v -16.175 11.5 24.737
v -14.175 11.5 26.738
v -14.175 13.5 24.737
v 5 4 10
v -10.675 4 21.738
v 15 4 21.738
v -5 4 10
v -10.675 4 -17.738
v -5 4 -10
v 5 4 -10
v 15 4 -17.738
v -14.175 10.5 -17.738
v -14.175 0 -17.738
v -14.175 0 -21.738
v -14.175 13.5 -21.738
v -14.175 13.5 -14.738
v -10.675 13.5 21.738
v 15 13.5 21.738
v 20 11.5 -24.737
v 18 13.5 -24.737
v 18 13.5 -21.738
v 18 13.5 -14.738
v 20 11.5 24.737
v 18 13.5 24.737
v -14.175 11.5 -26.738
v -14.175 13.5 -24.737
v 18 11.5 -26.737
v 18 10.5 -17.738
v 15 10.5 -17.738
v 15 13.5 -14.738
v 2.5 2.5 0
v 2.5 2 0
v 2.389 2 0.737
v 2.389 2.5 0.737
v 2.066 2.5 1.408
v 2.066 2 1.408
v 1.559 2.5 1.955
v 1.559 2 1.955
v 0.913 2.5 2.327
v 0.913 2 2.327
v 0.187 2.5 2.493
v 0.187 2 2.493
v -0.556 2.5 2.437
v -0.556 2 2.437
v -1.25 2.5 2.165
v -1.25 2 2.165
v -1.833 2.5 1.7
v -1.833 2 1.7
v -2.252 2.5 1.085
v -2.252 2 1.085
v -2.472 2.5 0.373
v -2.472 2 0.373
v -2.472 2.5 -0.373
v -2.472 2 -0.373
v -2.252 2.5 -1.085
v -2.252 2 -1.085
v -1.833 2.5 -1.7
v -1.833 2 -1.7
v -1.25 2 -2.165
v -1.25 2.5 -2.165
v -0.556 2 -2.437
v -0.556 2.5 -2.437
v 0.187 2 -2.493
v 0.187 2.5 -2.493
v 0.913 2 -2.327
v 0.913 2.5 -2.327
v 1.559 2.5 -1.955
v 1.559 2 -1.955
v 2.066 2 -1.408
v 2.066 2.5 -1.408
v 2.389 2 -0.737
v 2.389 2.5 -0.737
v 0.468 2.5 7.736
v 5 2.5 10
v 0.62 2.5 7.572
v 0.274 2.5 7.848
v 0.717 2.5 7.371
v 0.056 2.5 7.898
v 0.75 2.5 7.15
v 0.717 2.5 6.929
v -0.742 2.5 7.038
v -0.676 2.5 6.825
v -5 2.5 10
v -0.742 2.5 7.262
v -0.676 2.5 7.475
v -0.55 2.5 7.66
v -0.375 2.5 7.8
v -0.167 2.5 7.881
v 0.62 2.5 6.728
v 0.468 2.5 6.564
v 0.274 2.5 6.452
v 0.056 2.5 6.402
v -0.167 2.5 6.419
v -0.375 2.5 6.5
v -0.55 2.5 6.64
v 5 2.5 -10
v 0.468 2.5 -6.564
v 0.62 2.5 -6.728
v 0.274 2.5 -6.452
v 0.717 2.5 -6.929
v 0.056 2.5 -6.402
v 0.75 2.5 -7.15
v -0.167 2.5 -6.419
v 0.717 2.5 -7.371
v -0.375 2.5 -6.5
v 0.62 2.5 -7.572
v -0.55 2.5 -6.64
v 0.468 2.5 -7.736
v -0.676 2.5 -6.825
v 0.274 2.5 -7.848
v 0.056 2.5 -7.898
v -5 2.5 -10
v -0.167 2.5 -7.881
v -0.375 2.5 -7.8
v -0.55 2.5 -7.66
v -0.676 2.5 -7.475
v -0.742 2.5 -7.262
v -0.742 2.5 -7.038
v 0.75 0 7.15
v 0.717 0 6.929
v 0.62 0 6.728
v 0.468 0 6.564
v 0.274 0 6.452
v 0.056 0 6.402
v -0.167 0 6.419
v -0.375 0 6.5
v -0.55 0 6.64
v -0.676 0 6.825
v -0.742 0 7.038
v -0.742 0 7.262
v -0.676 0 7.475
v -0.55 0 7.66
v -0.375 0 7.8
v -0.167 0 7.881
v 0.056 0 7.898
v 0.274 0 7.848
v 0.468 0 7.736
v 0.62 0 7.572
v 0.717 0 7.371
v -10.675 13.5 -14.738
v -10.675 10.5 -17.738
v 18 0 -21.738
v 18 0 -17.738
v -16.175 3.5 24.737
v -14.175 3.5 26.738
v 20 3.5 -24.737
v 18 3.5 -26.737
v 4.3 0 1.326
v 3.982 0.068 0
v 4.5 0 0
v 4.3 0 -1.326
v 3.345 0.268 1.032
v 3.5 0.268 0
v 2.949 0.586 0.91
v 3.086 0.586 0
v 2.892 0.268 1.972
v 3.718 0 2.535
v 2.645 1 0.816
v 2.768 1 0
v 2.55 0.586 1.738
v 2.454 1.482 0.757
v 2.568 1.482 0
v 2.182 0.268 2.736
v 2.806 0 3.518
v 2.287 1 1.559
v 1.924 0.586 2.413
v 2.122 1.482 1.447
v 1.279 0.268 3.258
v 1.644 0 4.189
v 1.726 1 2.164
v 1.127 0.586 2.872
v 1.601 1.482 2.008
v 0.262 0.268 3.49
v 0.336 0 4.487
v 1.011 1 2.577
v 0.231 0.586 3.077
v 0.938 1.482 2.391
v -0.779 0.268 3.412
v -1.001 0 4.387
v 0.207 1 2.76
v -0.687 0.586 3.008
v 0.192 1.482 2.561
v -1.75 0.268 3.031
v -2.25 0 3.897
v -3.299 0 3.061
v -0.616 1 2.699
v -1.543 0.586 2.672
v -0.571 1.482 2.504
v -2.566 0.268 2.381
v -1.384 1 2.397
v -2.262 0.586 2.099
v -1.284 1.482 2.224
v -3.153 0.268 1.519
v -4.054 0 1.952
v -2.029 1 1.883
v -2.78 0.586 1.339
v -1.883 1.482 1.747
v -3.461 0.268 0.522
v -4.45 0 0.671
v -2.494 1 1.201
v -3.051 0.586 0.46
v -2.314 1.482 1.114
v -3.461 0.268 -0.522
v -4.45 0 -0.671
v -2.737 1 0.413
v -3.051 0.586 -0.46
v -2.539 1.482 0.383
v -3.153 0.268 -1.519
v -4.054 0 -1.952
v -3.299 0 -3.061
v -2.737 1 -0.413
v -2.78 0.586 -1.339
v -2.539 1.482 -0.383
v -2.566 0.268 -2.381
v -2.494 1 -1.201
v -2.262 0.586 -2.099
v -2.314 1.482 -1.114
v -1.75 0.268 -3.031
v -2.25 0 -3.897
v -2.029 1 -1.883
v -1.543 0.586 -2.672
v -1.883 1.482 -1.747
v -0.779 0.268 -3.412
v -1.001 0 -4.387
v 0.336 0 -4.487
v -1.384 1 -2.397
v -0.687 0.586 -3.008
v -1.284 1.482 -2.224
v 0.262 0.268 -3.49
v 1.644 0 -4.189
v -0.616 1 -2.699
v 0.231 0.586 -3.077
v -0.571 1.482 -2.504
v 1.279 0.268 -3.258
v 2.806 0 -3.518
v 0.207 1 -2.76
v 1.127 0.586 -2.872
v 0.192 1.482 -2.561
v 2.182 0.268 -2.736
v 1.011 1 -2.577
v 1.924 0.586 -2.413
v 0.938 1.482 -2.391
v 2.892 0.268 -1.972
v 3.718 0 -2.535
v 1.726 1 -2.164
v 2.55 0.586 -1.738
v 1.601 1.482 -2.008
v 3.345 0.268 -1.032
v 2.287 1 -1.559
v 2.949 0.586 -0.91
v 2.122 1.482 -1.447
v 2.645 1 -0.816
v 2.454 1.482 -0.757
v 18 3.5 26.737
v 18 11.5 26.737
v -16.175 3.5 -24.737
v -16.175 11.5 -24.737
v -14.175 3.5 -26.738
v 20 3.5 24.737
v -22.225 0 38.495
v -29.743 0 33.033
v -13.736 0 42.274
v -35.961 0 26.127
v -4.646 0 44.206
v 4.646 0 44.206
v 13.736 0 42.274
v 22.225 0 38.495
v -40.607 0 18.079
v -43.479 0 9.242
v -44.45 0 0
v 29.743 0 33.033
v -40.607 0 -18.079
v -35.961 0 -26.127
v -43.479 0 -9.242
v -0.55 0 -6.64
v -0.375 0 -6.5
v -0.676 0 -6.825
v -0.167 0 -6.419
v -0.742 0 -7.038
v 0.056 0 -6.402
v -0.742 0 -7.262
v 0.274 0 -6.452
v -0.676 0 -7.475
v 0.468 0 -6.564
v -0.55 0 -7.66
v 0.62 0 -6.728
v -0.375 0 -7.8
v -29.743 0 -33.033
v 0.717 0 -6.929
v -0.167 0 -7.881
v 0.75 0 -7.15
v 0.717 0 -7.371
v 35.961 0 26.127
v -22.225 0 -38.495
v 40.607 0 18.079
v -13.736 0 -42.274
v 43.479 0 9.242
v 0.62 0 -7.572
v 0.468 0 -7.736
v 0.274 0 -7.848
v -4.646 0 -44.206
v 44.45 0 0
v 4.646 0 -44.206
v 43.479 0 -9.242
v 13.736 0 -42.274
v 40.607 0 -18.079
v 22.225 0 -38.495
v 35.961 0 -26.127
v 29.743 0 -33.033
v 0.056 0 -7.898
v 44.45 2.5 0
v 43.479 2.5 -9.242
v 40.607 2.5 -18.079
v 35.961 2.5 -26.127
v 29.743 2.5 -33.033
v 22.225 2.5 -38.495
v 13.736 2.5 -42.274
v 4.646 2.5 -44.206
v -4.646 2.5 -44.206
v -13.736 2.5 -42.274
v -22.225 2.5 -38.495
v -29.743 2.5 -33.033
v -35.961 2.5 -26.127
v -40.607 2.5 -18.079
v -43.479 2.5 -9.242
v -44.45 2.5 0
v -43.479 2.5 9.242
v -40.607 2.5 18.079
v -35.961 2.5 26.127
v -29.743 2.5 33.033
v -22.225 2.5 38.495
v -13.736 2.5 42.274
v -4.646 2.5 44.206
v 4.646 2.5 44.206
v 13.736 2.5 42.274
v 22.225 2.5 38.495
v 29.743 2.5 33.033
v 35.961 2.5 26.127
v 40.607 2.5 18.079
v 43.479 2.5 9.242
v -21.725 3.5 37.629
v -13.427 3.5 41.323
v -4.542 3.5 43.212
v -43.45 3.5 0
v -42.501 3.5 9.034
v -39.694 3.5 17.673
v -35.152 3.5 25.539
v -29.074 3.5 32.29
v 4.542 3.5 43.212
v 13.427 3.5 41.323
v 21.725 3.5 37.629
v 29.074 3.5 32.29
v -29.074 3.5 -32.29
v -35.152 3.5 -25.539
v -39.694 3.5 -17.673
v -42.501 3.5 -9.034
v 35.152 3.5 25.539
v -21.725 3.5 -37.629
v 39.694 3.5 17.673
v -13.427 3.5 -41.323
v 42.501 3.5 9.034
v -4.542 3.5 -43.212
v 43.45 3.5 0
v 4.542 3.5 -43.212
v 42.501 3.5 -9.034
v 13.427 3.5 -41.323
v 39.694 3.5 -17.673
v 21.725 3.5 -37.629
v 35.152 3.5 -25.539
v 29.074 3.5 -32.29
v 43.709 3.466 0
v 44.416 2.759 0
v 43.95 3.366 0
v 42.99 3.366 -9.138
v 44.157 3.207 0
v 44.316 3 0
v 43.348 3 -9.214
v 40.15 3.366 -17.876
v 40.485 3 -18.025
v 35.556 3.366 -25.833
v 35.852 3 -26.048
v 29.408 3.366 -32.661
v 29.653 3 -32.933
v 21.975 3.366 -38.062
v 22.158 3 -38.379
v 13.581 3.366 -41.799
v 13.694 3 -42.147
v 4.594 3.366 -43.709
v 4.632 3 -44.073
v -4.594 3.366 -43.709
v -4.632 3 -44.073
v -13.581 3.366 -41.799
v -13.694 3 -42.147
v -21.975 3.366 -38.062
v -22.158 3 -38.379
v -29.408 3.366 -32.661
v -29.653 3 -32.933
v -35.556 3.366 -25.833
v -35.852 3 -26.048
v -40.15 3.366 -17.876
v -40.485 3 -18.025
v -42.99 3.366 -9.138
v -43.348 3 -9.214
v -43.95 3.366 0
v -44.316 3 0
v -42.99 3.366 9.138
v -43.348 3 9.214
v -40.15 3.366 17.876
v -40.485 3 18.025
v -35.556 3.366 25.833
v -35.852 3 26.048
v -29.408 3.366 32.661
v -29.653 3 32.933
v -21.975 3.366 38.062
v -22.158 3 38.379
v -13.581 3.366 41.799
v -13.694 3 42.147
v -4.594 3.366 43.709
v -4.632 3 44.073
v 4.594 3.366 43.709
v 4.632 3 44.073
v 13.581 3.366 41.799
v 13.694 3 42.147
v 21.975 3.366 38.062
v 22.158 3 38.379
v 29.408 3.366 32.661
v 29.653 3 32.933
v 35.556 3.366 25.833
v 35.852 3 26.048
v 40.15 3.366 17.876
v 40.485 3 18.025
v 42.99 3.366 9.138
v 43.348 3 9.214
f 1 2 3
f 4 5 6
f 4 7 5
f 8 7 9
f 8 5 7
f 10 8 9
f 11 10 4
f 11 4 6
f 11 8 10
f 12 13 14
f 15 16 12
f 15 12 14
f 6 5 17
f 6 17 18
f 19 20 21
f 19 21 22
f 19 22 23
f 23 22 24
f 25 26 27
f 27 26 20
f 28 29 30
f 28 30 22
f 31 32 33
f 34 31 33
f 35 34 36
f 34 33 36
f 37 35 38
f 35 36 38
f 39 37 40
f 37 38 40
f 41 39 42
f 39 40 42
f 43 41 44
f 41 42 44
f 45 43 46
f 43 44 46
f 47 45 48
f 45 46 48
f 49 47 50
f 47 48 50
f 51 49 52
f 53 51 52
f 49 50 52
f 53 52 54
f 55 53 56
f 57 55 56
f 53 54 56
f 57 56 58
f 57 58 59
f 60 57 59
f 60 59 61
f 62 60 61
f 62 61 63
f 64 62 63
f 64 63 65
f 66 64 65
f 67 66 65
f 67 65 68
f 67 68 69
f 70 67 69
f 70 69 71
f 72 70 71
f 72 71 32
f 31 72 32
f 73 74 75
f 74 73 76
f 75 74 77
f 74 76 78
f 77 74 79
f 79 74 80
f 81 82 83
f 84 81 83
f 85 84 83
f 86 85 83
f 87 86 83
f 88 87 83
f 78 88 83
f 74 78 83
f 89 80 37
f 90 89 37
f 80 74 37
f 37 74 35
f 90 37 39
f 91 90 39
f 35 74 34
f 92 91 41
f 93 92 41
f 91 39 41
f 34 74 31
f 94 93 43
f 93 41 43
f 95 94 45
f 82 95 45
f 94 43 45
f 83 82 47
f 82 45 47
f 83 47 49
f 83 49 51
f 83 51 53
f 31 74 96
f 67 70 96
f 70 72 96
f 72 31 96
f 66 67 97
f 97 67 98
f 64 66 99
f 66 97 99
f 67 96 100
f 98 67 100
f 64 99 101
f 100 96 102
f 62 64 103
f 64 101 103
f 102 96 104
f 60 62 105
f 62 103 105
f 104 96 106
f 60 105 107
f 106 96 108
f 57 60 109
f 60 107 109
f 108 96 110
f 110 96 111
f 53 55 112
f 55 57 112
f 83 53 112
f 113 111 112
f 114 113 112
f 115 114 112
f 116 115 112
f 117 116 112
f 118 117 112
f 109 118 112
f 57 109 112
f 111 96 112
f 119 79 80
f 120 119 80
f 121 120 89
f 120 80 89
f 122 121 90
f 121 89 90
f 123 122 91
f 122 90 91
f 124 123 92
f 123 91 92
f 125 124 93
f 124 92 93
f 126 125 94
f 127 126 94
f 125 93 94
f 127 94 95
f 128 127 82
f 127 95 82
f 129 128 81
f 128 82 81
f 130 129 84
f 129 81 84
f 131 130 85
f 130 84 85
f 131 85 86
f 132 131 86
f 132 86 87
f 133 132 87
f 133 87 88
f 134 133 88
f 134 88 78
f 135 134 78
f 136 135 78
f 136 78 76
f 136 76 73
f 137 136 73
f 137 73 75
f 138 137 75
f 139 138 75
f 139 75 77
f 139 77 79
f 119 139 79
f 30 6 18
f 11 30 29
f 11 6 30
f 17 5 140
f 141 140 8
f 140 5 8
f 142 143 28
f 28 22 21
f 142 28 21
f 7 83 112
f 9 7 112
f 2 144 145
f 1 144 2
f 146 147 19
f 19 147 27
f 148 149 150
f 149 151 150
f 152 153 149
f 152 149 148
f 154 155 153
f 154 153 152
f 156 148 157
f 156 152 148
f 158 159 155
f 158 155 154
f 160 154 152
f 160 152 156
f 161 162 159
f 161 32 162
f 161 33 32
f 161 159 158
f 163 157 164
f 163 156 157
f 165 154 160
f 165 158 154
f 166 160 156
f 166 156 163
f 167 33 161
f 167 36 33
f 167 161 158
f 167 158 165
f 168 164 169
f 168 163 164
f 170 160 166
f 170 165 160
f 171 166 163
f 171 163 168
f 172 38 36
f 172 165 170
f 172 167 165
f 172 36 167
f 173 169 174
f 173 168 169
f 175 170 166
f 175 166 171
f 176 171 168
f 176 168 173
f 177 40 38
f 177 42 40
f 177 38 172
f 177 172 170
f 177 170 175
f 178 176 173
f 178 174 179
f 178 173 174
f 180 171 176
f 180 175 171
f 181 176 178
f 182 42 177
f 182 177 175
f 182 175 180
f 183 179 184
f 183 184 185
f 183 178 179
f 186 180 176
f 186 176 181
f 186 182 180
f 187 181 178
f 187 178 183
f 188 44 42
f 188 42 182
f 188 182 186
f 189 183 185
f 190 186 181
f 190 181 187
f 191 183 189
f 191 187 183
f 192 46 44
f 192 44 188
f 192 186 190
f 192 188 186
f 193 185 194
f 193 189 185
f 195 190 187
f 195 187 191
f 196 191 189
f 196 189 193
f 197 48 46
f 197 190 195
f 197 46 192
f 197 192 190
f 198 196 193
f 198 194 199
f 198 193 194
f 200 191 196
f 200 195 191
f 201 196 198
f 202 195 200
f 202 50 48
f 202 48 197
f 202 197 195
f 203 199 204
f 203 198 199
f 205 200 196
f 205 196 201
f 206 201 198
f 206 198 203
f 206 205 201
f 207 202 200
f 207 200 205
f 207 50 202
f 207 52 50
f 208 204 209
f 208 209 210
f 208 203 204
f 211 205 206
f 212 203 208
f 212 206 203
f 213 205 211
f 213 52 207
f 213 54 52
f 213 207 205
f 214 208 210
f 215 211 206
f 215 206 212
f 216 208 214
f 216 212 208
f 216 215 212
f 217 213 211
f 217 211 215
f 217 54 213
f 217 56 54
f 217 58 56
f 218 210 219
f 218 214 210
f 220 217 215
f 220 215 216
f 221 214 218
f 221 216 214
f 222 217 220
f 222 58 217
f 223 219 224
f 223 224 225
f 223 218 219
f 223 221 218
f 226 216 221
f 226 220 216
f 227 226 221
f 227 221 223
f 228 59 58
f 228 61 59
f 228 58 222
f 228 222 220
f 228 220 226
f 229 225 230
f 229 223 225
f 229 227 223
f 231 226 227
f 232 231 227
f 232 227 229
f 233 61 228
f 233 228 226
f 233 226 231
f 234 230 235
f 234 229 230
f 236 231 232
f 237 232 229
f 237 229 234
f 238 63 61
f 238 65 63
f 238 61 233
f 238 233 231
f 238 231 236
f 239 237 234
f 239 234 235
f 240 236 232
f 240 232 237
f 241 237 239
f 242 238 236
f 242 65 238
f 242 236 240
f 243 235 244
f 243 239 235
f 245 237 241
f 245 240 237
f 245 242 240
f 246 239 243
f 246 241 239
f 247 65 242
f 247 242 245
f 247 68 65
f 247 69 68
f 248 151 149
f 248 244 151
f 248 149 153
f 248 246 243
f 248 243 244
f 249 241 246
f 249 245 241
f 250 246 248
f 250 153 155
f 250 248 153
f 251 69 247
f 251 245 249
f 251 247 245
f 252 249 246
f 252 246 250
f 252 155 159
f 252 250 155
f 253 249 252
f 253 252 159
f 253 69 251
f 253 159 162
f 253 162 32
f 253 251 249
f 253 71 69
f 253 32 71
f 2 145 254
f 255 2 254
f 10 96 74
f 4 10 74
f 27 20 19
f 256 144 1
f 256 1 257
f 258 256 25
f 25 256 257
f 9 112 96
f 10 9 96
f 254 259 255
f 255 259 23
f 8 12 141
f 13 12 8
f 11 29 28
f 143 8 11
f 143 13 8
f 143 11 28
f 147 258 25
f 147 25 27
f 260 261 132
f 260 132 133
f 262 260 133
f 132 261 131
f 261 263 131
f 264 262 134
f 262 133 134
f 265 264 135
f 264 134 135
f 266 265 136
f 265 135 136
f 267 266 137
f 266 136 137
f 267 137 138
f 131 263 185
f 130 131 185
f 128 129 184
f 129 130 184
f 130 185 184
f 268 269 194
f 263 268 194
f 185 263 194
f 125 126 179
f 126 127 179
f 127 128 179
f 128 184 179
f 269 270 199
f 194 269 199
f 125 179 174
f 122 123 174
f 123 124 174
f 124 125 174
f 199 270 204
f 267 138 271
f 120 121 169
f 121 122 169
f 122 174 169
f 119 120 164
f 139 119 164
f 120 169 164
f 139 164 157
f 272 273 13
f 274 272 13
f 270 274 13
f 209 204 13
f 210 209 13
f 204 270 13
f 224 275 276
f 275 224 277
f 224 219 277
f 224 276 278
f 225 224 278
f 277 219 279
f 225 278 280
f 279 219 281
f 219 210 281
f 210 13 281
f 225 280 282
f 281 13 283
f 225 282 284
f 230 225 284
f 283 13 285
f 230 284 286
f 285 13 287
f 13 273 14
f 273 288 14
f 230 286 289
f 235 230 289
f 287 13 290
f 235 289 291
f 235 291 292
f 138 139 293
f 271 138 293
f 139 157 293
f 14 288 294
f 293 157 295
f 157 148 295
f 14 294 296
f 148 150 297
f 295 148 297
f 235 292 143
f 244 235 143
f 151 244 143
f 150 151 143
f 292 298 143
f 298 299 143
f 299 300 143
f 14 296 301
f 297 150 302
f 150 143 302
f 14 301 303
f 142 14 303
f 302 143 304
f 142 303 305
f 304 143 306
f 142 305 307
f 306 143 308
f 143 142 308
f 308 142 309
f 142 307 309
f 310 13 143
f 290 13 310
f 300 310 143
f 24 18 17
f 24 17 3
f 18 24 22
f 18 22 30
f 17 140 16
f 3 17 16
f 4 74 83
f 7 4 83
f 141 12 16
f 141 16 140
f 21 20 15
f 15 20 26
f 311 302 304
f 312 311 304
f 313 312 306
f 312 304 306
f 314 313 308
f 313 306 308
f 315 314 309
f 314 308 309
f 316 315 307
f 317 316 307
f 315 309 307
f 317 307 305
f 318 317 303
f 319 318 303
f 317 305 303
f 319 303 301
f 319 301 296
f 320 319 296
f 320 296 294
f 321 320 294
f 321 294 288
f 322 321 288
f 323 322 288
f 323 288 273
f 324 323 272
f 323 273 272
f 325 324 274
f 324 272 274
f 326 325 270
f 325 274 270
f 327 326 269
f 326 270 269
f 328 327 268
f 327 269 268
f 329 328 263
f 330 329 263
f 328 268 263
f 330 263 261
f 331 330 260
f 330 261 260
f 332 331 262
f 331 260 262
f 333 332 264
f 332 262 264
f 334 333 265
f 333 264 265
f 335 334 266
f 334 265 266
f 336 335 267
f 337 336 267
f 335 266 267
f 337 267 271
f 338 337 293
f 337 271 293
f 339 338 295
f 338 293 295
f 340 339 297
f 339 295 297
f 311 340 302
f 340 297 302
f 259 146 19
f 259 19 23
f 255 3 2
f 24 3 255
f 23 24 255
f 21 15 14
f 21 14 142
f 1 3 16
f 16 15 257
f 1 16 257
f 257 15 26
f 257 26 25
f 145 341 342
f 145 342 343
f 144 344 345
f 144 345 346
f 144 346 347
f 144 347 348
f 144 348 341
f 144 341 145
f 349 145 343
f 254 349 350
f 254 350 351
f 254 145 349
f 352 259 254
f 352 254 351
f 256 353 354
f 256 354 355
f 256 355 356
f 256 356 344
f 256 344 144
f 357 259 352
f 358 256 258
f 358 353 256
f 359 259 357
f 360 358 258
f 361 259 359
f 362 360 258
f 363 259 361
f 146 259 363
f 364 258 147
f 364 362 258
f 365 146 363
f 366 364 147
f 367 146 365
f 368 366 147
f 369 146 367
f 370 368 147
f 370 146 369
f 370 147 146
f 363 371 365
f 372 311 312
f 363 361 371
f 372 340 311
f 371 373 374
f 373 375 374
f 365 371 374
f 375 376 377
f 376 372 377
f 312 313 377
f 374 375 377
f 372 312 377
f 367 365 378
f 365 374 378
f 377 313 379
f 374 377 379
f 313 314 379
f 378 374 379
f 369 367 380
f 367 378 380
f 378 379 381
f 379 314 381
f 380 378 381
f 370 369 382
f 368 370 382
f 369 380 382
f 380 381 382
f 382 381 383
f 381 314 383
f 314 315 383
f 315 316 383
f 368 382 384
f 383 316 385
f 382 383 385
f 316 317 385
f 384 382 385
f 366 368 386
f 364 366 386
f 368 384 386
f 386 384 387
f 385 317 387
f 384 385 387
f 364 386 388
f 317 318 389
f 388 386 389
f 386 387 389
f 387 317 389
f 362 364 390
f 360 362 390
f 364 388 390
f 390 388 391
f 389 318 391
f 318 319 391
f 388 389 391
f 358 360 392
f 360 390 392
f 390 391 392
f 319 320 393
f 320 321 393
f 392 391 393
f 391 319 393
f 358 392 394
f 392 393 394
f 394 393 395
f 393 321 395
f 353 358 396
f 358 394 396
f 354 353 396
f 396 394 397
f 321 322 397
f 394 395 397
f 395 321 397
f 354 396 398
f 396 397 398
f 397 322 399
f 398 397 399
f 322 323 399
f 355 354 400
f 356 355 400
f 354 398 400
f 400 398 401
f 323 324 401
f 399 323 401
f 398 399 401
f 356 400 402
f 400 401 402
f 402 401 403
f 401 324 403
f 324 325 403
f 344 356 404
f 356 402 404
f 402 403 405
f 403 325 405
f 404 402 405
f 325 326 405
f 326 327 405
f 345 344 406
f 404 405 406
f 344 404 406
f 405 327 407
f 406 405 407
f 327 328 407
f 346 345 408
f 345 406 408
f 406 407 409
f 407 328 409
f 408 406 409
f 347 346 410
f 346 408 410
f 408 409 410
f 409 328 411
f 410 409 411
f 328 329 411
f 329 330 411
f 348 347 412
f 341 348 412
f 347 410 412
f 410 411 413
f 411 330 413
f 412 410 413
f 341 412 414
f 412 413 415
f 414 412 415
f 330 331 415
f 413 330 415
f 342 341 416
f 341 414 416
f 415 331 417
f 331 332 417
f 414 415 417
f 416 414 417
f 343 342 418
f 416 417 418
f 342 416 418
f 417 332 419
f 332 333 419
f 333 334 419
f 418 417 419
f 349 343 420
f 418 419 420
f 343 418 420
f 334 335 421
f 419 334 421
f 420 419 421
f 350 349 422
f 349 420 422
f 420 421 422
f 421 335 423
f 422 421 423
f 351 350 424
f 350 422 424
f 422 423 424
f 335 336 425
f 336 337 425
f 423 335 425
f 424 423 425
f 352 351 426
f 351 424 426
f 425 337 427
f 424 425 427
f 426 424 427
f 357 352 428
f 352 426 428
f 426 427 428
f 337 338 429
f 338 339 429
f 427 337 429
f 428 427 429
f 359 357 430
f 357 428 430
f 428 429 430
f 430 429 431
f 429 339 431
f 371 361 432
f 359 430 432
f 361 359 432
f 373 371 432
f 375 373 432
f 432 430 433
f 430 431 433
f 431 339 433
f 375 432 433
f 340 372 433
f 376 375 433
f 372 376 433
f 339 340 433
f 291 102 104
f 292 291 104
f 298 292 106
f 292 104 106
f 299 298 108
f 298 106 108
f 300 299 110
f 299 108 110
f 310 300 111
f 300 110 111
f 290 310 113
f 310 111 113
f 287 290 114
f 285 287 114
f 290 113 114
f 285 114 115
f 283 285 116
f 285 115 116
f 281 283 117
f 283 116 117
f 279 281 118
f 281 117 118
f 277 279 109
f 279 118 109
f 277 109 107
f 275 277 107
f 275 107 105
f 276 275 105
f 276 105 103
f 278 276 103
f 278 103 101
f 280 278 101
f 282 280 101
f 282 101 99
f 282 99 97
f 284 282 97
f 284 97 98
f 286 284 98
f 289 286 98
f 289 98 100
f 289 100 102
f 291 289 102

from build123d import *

# Parameters (mm, degrees)
SKETCH1_R           = 44.45
BOSS_EXTRUDE1_DEPTH = 3.5
CUT_EXTRUDE1_DEPTH  = 1
SKETCH3_W           = 25.675
SKETCH3_H           = 43.475
BOSS_EXTRUDE2_DEPTH = 10
SKETCH4_W           = 25.675
SKETCH4_H           = 4
CUT_EXTRUDE2_DEPTH  = 13
SKETCH5_R           = 0.75
CUT_EXTRUDE3_DEPTH  = 13
SKETCH6_R           = 2.5
CUT_EXTRUDE4_DEPTH  = 13
FILLET1_R           = 1
CHAMFER1_SIZE       = 2
FILLET2_R           = 2
SKETCH8_W           = 3.5
SKETCH8_H           = 4
CUT_EXTRUDE6_DEPTH  = 14.5000001
SKETCH10_W          = 3
SKETCH10_H          = 4
CUT_EXTRUDE7_DEPTH  = 14.5000001
CHAMFER2_SIZE       = 3
SKETCH11_W          = 25.675
SKETCH11_H          = 39.475
BOSS_EXTRUDE3_DEPTH = 1.5


with BuildPart() as part:
    # Sketch1 → Boss-Extrude1 (new body)
    with BuildSketch(Plane(origin=(0, 0, 0), x_dir=(1, 0, 0), z_dir=(0, 1, 0))):
        Circle(SKETCH1_R)
    extrude(amount=BOSS_EXTRUDE1_DEPTH)

    # Sketch2 → Cut-Extrude1 (cut)
    with BuildSketch(Plane(origin=(0, 3.5, 0), x_dir=(1, 0, 0), z_dir=(0, 1, 0))):
        Polygon((15, 0), (15, -21.7375), (-10.675, -21.7375), (-10.675, 21.7375), (15, 21.7375), align=None)
    extrude(amount=-CUT_EXTRUDE1_DEPTH, mode=Mode.SUBTRACT)

    # Sketch3 → Boss-Extrude2 (add)
    with BuildSketch(Plane(origin=(0, 3.5, 0), x_dir=(1, 0, 0), z_dir=(0, 1, 0))):
        Polygon((20, -26.7375), (15, -26.7375), (-16.175, -26.7375), (-16.175, 26.7375), (20, 26.7375), align=None)
        with Locations((2.1625, 0)):
            Rectangle(SKETCH3_W, SKETCH3_H, mode=Mode.SUBTRACT)
    extrude(amount=BOSS_EXTRUDE2_DEPTH)

    # Sketch4 → Cut-Extrude2 (cut)
    with BuildSketch(Plane(origin=(0, 2.5, 0), x_dir=(1, 0, 0), z_dir=(0, 1, 0))):
        with Locations((2.1625, 19.7375)):
            Rectangle(SKETCH4_W, SKETCH4_H)
    extrude(amount=-CUT_EXTRUDE2_DEPTH, mode=Mode.SUBTRACT)

    # Sketch5 → Cut-Extrude3 (cut)
    with BuildSketch(Plane(origin=(0, 2.5, 0), x_dir=(1, 0, 0), z_dir=(0, 1, 0))):
        with Locations((0, -7.15)):
            Circle(SKETCH5_R)
        with Locations((0, 7.15)):
            Circle(SKETCH5_R)
    extrude(amount=-CUT_EXTRUDE3_DEPTH, mode=Mode.SUBTRACT)

    # Sketch6 → Cut-Extrude4 (cut)
    with BuildSketch(Plane.XZ):
        Circle(SKETCH6_R)
    extrude(amount=-CUT_EXTRUDE4_DEPTH, mode=Mode.SUBTRACT)

    # Fillet1
    fillet1_edges = [part.edges().sort_by_distance(p)[0] for p in [
        (-44.45, 3.5, 0),
    ]]
    fillet(fillet1_edges, radius=FILLET1_R)

    # Chamfer1
    chamfer1_edges = [part.edges().sort_by_distance(p)[0] for p in [
        (1.9125, 13.5, 26.7375),
        (-16.175, 8.5, 26.7375),
        (20, 13.5, 0),
        (20, 8.5, 26.7375),
        (1.9125, 13.5, -26.7375),
        (20, 8.5, -26.7375),
        (-16.175, 13.5, 0),
        (-16.175, 8.5, -26.7375),
    ]]
    chamfer(chamfer1_edges, length=CHAMFER1_SIZE)

    # Fillet2
    fillet2_edges = [part.edges().sort_by_distance(p)[0] for p in [
        (-2.5, 0, 0),
    ]]
    fillet(fillet2_edges, radius=FILLET2_R)

    # Sketch8 → Cut-Extrude6 (cut, through all)
    with BuildSketch(Plane(origin=(0, 13.5, 0), x_dir=(1, 0, 0), z_dir=(0, 1, 0))):
        with Locations((-12.425, 19.7375)):
            Rectangle(SKETCH8_W, SKETCH8_H)
    extrude(amount=-CUT_EXTRUDE6_DEPTH, mode=Mode.SUBTRACT)

    # Sketch10 → Cut-Extrude7 (cut, through all)
    with BuildSketch(Plane(origin=(0, 13.5, 0), x_dir=(1, 0, 0), z_dir=(0, 1, 0))):
        with Locations((16.5, 19.7375)):
            Rectangle(SKETCH10_W, SKETCH10_H)
    extrude(amount=-CUT_EXTRUDE7_DEPTH, mode=Mode.SUBTRACT)

    # Chamfer2
    chamfer2_edges = [part.edges().sort_by_distance(p)[0] for p in [
        (-12.425, 13.5, -17.7375),
        (16.5, 13.5, -17.7375),
    ]]
    chamfer(chamfer2_edges, length=CHAMFER2_SIZE)

    # Sketch11 → Boss-Extrude3 (add)
    with BuildSketch(Plane(origin=(0, 2.5, 0), x_dir=(1, 0, 0), z_dir=(0, 1, 0))):
        with Locations((2.1625, -2)):
            Rectangle(SKETCH11_W, SKETCH11_H)
        Polygon((-5, 10), (5, 10), (5, 0), (5, -10), (-5, -10), align=None, mode=Mode.SUBTRACT)
    extrude(amount=BOSS_EXTRUDE3_DEPTH)


solid = part.part
